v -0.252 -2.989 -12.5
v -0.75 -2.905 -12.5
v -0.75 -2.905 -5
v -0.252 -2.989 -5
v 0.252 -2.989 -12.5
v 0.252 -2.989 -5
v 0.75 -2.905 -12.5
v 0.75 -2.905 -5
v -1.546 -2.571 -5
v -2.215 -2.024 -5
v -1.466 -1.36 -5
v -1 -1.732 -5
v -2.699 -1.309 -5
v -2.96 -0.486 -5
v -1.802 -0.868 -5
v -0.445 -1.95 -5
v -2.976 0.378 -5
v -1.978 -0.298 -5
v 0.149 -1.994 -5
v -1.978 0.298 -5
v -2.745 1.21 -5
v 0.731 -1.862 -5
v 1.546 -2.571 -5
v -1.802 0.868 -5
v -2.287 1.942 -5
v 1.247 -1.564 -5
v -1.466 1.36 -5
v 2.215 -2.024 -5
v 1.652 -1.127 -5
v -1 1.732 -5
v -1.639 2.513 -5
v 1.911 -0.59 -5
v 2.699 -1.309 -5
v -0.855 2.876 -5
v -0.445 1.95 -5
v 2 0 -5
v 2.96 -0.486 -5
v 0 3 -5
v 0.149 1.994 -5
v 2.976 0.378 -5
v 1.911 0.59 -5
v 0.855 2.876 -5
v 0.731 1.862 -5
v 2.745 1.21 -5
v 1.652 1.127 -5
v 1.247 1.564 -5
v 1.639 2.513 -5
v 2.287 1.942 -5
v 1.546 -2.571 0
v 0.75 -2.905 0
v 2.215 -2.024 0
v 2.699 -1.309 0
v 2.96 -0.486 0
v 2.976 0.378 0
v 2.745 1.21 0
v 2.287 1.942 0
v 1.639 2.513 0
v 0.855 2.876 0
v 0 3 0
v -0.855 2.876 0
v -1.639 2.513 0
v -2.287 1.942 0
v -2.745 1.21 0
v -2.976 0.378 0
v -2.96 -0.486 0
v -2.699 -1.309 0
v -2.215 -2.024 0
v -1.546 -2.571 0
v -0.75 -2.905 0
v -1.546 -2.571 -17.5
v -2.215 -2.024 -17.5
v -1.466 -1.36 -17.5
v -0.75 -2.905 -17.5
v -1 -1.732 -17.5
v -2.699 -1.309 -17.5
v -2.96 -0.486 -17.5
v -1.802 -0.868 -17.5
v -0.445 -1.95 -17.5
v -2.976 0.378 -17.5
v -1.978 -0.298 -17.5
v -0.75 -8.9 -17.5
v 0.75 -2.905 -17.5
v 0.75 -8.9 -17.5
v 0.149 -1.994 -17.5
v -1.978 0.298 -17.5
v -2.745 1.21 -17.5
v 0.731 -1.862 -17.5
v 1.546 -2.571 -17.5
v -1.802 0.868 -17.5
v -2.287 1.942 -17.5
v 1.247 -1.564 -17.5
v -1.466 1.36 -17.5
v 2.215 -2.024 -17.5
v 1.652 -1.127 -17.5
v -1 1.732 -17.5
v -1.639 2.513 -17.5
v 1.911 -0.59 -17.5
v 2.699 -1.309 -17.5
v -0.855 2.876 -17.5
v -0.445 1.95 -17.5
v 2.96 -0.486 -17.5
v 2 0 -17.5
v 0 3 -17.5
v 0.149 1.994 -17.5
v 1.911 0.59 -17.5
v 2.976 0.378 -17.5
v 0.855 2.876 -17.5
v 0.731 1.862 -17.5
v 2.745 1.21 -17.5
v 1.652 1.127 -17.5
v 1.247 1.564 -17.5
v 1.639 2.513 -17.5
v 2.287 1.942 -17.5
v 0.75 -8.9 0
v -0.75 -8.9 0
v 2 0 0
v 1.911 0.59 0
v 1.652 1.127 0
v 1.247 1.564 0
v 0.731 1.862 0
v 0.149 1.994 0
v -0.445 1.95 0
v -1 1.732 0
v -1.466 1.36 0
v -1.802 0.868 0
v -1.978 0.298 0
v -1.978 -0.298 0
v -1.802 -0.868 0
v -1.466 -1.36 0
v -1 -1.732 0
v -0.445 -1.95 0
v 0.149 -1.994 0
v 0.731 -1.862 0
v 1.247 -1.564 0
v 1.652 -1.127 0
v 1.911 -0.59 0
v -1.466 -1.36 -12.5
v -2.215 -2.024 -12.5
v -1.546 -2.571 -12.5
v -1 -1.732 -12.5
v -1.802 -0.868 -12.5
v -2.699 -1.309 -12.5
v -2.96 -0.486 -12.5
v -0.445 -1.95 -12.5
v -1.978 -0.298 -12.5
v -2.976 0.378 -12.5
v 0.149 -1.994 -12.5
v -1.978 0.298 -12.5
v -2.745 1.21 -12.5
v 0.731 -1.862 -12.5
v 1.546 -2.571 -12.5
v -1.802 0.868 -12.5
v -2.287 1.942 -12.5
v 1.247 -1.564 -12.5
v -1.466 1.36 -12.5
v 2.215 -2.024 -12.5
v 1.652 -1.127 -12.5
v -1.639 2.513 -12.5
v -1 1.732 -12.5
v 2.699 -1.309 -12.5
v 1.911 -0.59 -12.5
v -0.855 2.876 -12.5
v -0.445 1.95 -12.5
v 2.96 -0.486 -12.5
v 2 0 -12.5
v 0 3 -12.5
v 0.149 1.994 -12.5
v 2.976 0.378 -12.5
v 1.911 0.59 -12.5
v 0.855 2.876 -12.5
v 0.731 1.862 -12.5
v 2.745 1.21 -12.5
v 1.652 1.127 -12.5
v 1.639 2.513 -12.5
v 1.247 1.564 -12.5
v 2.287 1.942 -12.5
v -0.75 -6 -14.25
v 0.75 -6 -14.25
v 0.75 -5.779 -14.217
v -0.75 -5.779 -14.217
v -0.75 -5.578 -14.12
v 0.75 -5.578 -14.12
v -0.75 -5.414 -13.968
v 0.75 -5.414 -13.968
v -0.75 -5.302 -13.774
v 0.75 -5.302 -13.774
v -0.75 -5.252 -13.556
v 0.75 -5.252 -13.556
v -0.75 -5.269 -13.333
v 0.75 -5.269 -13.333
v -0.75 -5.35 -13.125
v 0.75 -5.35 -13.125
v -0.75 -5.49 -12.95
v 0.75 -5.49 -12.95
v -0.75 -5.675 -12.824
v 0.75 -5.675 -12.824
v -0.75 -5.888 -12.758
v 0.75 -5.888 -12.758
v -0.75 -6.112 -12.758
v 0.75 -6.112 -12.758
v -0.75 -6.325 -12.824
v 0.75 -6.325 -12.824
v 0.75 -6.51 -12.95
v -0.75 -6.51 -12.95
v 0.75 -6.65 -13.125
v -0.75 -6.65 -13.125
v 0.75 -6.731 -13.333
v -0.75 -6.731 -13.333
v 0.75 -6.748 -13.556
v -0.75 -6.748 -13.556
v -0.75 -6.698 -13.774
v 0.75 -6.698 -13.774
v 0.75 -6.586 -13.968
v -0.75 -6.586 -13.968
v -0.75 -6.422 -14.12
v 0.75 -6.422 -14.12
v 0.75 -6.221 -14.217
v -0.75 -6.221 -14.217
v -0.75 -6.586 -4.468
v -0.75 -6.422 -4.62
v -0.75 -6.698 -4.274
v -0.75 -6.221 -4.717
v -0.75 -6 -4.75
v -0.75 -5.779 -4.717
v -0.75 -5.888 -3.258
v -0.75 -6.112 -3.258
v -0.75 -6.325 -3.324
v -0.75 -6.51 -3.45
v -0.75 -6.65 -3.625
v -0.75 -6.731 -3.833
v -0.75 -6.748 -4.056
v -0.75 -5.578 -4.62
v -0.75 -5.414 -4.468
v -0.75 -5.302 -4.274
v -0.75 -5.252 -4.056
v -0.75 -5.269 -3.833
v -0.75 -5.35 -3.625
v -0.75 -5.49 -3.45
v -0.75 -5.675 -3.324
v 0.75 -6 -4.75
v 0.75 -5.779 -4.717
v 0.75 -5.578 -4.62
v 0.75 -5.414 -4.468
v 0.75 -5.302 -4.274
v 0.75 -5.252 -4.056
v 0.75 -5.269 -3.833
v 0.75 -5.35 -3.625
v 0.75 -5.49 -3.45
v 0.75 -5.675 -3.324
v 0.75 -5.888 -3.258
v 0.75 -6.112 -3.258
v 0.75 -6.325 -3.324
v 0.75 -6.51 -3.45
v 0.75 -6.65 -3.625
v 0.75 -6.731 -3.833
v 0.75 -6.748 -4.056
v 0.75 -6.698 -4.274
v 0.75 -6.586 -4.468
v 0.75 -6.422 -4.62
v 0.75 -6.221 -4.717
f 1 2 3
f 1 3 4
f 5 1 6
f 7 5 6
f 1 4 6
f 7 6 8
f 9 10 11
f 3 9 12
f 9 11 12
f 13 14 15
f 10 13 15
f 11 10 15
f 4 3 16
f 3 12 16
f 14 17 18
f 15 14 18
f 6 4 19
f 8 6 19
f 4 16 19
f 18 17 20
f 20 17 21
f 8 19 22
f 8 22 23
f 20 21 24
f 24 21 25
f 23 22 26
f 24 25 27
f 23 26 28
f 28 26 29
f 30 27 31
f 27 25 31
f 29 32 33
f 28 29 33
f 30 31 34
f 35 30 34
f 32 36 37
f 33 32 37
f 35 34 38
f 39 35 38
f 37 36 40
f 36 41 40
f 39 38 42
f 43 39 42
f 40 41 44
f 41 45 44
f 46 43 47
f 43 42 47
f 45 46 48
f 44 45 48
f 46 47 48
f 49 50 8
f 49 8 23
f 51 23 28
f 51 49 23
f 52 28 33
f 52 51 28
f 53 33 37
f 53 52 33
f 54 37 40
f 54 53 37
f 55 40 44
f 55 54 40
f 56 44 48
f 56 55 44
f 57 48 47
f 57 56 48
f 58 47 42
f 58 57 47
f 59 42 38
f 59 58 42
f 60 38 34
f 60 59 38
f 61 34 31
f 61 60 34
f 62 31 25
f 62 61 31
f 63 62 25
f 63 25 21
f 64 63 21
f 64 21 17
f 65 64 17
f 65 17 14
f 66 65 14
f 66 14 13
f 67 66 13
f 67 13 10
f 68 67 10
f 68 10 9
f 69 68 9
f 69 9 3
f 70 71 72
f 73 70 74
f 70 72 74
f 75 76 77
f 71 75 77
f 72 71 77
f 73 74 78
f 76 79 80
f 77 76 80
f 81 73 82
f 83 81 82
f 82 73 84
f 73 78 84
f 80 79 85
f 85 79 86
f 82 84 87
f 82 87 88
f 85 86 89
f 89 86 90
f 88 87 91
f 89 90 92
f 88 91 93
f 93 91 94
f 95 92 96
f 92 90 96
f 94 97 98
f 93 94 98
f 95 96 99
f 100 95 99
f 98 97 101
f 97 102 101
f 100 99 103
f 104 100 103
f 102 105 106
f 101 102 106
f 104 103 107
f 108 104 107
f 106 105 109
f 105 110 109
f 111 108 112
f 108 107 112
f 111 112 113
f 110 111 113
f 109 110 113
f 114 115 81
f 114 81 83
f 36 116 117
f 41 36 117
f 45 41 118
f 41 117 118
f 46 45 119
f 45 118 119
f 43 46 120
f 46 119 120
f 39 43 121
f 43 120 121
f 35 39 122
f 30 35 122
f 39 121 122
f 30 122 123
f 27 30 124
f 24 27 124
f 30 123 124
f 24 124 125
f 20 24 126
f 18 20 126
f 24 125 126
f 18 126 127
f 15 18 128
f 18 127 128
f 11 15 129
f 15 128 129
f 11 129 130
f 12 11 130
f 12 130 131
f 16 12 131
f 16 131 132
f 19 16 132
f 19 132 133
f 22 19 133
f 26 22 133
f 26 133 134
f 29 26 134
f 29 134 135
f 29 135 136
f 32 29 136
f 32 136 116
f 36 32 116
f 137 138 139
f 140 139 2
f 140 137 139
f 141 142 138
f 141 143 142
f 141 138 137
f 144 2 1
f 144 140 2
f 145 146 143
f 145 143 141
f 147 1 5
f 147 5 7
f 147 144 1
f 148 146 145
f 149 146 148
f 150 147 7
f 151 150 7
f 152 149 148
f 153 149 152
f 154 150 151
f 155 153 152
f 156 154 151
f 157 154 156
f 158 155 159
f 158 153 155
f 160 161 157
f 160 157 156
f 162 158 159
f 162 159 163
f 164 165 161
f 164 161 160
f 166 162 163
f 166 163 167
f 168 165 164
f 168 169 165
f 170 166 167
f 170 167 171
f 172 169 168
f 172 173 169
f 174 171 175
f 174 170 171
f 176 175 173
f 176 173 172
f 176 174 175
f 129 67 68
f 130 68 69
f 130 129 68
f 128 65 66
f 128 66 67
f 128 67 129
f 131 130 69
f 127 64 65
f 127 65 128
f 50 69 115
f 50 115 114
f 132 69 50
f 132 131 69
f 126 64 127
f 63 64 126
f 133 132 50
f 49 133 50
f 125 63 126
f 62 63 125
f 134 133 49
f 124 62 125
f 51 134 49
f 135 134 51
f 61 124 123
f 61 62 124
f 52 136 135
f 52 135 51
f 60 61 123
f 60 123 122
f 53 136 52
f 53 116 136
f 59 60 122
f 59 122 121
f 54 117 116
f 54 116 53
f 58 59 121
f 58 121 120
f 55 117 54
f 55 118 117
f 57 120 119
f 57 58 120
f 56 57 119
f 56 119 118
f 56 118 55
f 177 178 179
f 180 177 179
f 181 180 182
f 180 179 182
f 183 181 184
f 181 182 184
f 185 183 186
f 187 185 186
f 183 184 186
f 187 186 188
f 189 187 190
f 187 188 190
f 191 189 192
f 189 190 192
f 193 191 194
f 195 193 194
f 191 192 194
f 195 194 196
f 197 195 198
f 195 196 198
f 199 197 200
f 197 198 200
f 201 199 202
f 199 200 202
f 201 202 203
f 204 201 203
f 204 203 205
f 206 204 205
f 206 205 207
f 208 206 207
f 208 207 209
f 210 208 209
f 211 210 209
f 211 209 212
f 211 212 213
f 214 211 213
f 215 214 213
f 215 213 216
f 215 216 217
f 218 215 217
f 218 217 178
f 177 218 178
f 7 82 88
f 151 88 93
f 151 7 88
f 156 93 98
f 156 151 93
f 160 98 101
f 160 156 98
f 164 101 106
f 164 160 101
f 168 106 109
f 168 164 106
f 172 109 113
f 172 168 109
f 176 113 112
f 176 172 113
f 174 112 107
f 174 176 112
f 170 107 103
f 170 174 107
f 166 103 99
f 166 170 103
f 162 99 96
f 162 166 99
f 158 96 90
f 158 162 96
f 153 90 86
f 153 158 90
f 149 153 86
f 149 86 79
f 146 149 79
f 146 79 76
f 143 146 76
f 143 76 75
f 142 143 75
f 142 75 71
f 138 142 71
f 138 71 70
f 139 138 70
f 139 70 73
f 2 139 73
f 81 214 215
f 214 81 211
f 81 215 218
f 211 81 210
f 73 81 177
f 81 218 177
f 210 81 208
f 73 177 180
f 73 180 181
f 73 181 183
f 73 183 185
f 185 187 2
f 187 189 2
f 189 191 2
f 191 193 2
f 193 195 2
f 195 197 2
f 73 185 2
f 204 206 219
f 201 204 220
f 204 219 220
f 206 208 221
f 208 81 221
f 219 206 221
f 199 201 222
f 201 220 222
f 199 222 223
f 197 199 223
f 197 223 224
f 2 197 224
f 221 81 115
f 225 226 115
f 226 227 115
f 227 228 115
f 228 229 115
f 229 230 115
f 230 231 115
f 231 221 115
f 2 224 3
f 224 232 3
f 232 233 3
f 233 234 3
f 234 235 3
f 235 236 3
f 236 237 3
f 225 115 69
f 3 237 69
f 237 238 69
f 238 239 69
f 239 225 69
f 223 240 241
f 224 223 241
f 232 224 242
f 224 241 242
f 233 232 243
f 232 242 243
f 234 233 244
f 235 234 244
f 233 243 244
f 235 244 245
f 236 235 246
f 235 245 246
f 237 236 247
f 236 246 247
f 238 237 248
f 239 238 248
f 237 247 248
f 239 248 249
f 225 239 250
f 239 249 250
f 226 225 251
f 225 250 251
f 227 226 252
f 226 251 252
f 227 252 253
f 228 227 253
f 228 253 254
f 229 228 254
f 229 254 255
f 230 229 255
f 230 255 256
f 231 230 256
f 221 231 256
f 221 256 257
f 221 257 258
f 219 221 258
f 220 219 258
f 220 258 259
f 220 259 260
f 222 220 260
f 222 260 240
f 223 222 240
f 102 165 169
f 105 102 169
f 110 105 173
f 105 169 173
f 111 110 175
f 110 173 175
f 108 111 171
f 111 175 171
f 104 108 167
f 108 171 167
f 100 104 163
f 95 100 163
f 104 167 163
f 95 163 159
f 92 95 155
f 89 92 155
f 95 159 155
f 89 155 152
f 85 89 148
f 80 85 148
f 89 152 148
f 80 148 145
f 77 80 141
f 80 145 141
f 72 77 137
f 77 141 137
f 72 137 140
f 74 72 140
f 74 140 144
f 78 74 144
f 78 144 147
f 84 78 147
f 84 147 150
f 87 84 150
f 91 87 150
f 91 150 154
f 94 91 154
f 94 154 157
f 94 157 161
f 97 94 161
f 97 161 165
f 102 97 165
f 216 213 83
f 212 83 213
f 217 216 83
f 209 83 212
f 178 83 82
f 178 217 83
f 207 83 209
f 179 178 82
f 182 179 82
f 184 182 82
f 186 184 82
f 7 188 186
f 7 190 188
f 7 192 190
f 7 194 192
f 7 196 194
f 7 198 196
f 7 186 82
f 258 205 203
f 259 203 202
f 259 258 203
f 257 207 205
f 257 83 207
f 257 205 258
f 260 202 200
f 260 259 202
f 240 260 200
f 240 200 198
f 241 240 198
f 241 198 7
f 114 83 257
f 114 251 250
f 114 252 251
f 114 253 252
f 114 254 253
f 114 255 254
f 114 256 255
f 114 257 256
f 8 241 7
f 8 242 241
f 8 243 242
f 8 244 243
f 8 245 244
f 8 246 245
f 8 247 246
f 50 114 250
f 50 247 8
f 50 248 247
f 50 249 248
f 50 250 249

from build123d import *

# Parameters (mm, degrees)
SKETCH2_R           = 2
BOSS_EXTRUDE4_DEPTH = 17.5
CUT_EXTRUDE3_START  = -5
SKETCH2_4_R         = 3
SKETCH2_4_R_2       = 2
CUT_EXTRUDE3_DEPTH  = 7.5
SKETCH4_R           = 0.75
CUT_EXTRUDE6_DEPTH  = 10


with BuildPart() as part:
    # Sketch2 → Boss-Extrude4 (new body)
    with BuildSketch(Plane.XY):
        with BuildLine():
            Line((-0.75, -2.90473751), (-0.75, -8.9))
            Line((-0.75, -8.9), (0.75, -8.9))
            Line((0.75, -8.9), (0.75, -2.90473751))
            ThreePointArc((0.75, -2.90473751), (0, 3), (-0.75, -2.90473751))
        make_face()
        Circle(SKETCH2_R, mode=Mode.SUBTRACT)
    extrude(amount=-BOSS_EXTRUDE4_DEPTH)

    # Sketch2<4> → Cut-Extrude3 (cut)
    with BuildSketch(Plane.XY.offset(CUT_EXTRUDE3_START)):
        Circle(SKETCH2_4_R)
        Circle(SKETCH2_4_R_2, mode=Mode.SUBTRACT)
    extrude(amount=-CUT_EXTRUDE3_DEPTH, mode=Mode.SUBTRACT)

    # Sketch4 → Cut-Extrude6 (cut)
    with BuildSketch(Plane(origin=(0.75, 0, 0), x_dir=(0, 0, -1), z_dir=(1, 0, 0))):
        with Locations((4, -6)):
            Circle(SKETCH4_R)
        with Locations((13.5, -6)):
            Circle(SKETCH4_R)
    extrude(amount=-CUT_EXTRUDE6_DEPTH, mode=Mode.SUBTRACT)


solid = part.part
